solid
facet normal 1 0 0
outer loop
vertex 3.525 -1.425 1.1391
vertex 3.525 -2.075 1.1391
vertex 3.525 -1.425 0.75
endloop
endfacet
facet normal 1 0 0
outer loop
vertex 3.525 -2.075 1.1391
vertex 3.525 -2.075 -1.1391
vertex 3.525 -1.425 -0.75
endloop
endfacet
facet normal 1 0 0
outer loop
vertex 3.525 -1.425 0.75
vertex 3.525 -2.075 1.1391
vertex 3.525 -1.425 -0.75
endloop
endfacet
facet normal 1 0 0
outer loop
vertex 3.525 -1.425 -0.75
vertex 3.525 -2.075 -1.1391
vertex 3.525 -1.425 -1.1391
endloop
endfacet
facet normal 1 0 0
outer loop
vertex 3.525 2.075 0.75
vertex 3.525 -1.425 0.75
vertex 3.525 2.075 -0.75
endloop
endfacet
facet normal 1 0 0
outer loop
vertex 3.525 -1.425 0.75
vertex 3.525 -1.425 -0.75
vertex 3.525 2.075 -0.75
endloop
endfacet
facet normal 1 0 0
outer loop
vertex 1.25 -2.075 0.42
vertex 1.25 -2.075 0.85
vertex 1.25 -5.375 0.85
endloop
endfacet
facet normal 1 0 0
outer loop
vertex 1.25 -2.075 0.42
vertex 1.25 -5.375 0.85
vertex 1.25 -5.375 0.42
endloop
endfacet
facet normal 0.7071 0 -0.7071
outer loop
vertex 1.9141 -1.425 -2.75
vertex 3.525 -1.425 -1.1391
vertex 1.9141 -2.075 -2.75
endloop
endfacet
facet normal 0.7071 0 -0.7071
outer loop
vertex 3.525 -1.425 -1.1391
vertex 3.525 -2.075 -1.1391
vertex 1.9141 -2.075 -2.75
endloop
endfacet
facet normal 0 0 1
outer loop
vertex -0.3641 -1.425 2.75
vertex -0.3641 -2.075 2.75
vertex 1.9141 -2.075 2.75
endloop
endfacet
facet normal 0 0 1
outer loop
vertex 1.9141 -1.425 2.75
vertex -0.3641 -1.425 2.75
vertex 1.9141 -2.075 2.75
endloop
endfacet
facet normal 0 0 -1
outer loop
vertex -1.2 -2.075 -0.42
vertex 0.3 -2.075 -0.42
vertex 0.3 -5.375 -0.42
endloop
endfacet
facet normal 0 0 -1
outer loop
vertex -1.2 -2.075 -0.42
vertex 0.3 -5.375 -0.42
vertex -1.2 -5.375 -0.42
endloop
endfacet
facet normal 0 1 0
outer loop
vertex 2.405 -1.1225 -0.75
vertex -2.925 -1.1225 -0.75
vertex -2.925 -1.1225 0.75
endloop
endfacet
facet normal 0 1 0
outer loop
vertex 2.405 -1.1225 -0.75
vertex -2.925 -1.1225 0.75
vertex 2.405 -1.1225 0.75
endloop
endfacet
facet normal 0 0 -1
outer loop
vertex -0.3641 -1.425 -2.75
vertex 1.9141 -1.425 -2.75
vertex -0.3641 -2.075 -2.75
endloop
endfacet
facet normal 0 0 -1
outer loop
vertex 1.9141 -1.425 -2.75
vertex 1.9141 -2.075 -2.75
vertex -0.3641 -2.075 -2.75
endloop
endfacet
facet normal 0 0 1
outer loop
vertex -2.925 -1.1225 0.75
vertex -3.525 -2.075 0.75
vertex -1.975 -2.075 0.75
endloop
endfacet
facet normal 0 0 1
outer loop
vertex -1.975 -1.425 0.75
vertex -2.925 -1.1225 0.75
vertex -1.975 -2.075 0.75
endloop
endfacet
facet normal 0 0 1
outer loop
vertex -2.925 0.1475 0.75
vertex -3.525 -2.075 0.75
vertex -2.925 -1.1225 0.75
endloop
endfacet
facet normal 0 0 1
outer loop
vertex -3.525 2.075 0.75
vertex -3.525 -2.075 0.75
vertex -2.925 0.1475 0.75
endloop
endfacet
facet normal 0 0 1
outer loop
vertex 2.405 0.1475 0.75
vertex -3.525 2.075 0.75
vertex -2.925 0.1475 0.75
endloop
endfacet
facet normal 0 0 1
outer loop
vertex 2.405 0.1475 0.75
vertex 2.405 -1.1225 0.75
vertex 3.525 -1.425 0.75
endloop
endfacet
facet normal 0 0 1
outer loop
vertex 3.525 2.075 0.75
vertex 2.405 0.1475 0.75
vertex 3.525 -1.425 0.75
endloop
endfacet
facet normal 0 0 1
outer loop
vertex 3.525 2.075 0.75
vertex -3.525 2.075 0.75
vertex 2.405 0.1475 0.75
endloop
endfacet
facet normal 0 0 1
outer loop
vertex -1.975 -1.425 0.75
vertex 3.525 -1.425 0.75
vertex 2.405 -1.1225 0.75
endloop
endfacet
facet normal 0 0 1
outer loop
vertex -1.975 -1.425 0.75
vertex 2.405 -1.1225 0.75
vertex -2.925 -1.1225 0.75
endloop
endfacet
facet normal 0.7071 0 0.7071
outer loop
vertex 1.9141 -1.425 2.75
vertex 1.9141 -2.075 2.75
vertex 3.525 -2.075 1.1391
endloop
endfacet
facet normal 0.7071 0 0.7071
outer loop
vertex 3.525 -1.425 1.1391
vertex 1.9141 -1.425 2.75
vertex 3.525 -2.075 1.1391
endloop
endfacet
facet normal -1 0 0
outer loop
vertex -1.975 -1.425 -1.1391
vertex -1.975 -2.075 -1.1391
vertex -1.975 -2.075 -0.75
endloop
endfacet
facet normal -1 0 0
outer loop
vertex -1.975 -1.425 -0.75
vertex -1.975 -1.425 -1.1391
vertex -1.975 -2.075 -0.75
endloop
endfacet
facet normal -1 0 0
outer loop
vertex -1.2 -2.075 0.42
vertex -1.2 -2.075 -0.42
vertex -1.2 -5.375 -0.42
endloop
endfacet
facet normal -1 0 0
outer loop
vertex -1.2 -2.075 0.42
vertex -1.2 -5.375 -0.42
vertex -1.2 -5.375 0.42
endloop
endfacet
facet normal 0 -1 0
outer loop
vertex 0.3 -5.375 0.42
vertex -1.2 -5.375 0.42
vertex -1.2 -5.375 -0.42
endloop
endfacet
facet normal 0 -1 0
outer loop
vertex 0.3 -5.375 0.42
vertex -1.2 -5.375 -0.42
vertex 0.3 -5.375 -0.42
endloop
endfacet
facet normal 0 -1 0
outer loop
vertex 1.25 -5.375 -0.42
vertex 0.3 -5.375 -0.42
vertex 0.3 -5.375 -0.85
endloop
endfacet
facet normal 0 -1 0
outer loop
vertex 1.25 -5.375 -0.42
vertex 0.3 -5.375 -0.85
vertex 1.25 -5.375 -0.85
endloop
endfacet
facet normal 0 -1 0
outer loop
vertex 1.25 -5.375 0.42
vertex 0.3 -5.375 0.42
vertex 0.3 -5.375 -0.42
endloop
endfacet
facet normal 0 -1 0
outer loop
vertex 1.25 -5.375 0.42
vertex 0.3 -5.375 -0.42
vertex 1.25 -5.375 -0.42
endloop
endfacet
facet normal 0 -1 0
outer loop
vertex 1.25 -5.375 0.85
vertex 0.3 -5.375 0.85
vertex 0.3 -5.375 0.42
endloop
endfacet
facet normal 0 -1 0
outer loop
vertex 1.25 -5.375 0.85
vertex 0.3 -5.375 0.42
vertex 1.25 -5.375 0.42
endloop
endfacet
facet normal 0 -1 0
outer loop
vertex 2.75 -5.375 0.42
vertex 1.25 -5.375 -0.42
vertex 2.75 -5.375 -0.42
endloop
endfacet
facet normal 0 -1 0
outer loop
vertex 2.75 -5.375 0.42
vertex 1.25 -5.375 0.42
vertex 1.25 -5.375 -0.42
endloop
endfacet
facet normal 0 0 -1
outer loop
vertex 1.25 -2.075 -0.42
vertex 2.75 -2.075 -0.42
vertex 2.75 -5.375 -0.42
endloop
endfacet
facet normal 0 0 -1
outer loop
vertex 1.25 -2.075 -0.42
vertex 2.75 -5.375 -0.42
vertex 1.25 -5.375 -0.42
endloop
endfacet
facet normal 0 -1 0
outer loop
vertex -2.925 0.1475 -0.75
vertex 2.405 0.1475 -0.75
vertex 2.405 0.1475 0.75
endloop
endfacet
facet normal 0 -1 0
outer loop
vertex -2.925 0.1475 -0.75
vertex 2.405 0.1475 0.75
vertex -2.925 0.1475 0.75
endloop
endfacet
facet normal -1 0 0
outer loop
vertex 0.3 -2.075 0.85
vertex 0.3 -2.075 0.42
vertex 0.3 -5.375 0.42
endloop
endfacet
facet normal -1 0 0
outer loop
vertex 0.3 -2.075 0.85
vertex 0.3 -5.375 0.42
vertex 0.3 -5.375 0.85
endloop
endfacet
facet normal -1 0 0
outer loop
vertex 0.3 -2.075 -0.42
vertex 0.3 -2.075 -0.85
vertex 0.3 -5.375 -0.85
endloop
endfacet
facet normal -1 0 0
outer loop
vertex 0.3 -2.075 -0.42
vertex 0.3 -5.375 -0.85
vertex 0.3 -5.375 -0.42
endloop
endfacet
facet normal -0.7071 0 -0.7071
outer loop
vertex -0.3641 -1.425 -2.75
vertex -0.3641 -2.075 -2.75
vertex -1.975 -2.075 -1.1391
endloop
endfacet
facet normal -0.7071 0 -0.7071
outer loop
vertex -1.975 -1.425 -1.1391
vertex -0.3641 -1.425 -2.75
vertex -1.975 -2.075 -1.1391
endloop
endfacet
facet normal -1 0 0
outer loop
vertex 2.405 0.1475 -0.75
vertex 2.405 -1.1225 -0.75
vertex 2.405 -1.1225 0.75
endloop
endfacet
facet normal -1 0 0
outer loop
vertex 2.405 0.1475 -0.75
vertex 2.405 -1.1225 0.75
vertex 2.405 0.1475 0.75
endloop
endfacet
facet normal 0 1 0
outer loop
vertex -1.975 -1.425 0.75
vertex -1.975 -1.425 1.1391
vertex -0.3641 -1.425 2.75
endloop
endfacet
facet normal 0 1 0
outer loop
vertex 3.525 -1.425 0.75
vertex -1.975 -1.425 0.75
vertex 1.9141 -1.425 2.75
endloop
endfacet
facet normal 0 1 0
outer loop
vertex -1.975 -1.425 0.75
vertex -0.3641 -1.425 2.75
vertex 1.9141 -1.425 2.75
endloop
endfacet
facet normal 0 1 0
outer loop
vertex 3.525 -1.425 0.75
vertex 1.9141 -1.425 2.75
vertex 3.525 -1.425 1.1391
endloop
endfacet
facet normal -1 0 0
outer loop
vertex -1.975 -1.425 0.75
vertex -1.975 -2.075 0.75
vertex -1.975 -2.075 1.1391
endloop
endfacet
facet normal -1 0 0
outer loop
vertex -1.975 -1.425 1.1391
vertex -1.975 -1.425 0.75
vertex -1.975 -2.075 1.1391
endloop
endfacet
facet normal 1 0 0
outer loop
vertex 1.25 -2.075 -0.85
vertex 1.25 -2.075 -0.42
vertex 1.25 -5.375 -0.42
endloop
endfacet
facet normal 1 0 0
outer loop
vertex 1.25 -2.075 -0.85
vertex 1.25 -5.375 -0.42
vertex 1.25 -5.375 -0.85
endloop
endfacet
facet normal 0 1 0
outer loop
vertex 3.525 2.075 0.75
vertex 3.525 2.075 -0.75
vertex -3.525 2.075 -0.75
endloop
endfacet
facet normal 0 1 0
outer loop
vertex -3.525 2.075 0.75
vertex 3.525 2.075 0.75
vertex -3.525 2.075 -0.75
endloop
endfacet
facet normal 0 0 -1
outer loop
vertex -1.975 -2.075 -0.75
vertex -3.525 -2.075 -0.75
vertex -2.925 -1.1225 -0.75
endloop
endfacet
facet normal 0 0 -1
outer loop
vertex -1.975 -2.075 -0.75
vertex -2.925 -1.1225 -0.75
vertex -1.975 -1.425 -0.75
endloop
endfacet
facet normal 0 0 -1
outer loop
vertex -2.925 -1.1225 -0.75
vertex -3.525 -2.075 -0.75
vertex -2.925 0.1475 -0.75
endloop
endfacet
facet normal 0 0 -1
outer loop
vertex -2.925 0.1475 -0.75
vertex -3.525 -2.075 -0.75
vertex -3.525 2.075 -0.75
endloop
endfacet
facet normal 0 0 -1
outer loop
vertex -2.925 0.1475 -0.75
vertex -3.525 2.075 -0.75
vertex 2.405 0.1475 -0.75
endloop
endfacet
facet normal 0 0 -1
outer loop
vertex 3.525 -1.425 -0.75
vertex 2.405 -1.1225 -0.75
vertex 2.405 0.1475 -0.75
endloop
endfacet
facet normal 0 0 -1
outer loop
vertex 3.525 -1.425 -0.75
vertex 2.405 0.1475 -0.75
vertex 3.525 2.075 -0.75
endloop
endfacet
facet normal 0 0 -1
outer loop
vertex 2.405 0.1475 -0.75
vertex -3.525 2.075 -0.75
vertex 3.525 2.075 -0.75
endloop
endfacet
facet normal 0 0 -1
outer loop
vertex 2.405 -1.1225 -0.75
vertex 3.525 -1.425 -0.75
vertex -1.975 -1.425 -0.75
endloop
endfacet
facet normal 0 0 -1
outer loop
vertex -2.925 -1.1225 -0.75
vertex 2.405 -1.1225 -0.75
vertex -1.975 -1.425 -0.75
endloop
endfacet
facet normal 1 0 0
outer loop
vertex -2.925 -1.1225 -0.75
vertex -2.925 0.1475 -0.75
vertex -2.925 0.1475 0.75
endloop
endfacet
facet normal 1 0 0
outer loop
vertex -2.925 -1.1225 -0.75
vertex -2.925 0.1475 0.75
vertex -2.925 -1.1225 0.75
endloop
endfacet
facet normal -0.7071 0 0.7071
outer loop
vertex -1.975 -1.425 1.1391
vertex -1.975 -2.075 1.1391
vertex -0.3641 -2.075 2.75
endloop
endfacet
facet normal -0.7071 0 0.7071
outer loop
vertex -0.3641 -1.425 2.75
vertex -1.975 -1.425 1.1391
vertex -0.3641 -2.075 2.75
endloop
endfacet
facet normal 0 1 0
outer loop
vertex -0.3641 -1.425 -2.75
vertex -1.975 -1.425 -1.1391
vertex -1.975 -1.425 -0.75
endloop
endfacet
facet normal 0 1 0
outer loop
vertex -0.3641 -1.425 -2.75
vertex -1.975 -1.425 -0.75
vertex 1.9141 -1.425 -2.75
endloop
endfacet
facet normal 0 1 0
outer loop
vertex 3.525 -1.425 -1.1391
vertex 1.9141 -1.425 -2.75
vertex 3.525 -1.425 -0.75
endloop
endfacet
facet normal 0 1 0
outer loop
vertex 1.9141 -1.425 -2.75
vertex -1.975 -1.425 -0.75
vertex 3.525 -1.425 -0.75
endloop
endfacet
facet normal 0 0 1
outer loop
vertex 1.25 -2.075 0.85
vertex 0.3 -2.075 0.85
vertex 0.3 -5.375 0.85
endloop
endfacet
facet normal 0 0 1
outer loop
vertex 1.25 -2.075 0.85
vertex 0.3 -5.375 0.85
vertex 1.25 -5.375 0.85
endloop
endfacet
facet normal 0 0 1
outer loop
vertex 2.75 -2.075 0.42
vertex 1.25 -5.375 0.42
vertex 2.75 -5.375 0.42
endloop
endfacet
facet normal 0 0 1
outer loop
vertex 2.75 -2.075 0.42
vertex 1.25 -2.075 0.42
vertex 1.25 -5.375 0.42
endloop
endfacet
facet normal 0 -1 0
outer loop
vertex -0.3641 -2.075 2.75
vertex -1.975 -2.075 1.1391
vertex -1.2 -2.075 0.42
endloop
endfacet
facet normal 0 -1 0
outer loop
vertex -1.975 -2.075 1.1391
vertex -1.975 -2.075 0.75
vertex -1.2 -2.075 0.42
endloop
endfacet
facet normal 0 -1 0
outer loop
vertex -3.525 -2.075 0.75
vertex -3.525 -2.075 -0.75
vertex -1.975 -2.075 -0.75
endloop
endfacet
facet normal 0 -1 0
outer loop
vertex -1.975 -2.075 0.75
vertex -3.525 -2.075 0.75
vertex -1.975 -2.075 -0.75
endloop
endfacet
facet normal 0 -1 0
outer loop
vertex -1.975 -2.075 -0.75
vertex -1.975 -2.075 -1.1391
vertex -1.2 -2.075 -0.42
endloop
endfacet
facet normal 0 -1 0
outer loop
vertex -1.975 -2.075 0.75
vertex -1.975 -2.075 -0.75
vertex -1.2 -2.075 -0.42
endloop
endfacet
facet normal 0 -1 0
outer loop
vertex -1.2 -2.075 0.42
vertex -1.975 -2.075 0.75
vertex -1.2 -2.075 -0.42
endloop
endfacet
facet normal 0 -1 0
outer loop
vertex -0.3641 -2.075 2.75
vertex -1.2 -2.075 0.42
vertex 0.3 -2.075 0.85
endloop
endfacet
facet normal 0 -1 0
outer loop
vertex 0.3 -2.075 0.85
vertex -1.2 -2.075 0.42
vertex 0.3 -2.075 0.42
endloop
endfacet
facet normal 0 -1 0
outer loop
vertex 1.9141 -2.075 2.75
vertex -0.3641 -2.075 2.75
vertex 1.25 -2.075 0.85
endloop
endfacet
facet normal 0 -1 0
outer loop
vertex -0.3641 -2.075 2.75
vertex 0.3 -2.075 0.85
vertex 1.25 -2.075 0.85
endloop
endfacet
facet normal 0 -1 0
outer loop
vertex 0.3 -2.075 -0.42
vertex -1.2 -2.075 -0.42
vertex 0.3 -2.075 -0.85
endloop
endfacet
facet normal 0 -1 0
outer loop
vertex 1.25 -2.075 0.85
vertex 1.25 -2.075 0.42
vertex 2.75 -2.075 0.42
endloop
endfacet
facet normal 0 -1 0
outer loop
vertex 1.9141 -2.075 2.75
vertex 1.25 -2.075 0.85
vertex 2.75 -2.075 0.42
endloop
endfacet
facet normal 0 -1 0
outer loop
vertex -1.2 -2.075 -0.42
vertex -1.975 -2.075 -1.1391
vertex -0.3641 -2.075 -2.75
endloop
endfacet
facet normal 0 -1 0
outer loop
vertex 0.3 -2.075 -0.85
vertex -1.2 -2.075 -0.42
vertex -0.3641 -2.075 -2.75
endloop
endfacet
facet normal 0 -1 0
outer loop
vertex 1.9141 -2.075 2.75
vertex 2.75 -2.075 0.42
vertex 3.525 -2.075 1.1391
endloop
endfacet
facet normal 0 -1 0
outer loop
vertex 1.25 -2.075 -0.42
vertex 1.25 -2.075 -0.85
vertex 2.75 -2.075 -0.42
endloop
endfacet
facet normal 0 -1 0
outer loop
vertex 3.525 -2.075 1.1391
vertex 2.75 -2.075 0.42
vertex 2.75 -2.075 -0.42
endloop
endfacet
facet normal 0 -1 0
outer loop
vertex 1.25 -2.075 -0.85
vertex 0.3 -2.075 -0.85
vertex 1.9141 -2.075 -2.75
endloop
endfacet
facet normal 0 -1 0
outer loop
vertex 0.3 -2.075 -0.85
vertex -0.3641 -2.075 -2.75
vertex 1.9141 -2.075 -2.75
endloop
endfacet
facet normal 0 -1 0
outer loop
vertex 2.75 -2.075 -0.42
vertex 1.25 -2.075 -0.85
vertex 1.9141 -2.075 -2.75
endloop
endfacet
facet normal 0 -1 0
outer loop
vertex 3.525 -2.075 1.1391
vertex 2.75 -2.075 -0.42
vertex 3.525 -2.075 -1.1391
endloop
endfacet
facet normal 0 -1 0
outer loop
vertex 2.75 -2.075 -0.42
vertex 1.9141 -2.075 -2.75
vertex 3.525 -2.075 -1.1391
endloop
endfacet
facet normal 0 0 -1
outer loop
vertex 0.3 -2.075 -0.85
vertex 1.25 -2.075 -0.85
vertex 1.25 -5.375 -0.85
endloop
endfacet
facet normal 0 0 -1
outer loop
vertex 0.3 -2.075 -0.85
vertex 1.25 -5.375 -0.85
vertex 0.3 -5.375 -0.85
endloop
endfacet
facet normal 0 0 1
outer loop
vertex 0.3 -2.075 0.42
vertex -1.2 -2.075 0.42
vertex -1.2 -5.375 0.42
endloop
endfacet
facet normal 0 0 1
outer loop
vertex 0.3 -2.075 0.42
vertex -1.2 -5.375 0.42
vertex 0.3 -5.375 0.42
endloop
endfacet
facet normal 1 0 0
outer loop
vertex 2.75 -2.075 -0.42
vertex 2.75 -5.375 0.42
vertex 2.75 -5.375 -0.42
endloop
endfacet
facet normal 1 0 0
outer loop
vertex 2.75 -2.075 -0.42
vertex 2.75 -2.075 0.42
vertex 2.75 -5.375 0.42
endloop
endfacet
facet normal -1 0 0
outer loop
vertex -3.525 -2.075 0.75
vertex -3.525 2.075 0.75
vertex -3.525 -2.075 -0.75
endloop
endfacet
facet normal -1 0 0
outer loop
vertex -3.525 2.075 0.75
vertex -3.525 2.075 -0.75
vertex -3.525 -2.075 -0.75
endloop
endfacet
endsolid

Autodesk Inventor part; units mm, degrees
ref_plane "YZ Plane" through (0, 0, 0) normal (1, 0, 0) x (0, 1, 0)
ref_plane "XZ Plane" through (0, 0, 0) normal (0, 1, 0) x (-1, 0, 0)
ref_plane "XY Plane" through (0, 0, 0) normal (0, 0, 1) x (1, 0, 0)
sketch "Sketch1" plane through (0, 0, 0) normal (0, 0, 1) x (1, 0, 0)
  line L0 (-3.525, -2.075) -> (3.525, -2.075)
  line L1 (3.525, -2.075) -> (3.525, 2.075)
  line L2 (3.525, 2.075) -> (-3.525, 2.075)
  line L3 (-3.525, 2.075) -> (-3.525, -2.075)
  line L4 (-3.525, -2.075) -> (3.525, 2.075) construction
  line L5 (3.525, -2.075) -> (-3.525, 2.075) construction
  line L6 (-2.925, -1.1225) -> (2.405, -1.1225)
  line L7 (2.405, -1.1225) -> (2.405, 0.1475)
  line L8 (2.405, 0.1475) -> (-2.925, 0.1475)
  line L9 (-2.925, 0.1475) -> (-2.925, -1.1225)
  point P0 (0, 0)
  dimension "d0" = 4.15
  dimension "d1" = 7.05
  dimension "d2" = 5.33
  dimension "d3" = 0.6
  dimension "d4" = 1.27
  dimension "d5" = 0.9525
extrude "Extrusion1" add sketch "Sketch1" along normal mid plane 1.5
sketch "Sketch2" plane through (-3.525, -2.075, 0.75) normal (0, -1, 0) x (1, 0, 0)
  line L0 (7.05, 0.3891) -> (7.05, -1.8891)
  line L1 (7.05, -1.8891) -> (5.4391, -3.5)
  line L2 (5.4391, -3.5) -> (3.1609, -3.5)
  line L3 (3.1609, -3.5) -> (1.55, -1.8891)
  line L4 (1.55, -1.8891) -> (1.55, 0.3891)
  line L5 (1.55, 0.3891) -> (3.1609, 2)
  line L6 (3.1609, 2) -> (5.4391, 2)
  line L7 (5.4391, 2) -> (7.05, 0.3891)
  line L8 (7.05, -1.5) -> (7.05, 0) projected
  line L9 (3.825, -0.33) -> (3.825, 0.1)
  line L10 (3.825, 0.1) -> (4.775, 0.1)
  line L11 (4.775, 0.1) -> (4.775, -0.33)
  line L12 (4.775, -0.33) -> (6.275, -0.33)
  line L13 (6.275, -0.33) -> (6.275, -1.17)
  line L14 (6.275, -1.17) -> (4.775, -1.17)
  line L15 (4.775, -1.17) -> (4.775, -1.6)
  line L16 (4.775, -1.6) -> (3.825, -1.6)
  line L17 (3.825, -1.6) -> (3.825, -1.17)
  line L18 (3.825, -1.17) -> (2.325, -1.17)
  line L19 (2.325, -1.17) -> (2.325, -0.33)
  line L20 (2.325, -0.33) -> (3.825, -0.33)
  line L21 (4.3, 0.1) -> (4.3, -1.6) construction
  line L22 (2.325, -0.75) -> (6.275, -0.75) construction
  point P0 (3.525, -0.75)
  point P1 (4.3, -0.75)
  dimension "d8" = 5.5
  dimension "d9" = 3.95
  dimension "d10" = 1.7
  dimension "d11" = 0.84
  dimension "d12" = 0.95
extrude "Extrusion2" add sketch "Sketch2" against normal blind 0.65 contours L0 L1 L2 L3 L4 L5 L6 L7 | L9 L10 L11 L12 L13 L14 L15 L16 L17 L18 L19 L20
extrude "Extrusion3" add sketch "Sketch2" along normal blind 3.3 contours L9 L10 L11 L12 L13 L14 L15 L16 L17 L18 L19 L20
properties part number "Replacement latch"
